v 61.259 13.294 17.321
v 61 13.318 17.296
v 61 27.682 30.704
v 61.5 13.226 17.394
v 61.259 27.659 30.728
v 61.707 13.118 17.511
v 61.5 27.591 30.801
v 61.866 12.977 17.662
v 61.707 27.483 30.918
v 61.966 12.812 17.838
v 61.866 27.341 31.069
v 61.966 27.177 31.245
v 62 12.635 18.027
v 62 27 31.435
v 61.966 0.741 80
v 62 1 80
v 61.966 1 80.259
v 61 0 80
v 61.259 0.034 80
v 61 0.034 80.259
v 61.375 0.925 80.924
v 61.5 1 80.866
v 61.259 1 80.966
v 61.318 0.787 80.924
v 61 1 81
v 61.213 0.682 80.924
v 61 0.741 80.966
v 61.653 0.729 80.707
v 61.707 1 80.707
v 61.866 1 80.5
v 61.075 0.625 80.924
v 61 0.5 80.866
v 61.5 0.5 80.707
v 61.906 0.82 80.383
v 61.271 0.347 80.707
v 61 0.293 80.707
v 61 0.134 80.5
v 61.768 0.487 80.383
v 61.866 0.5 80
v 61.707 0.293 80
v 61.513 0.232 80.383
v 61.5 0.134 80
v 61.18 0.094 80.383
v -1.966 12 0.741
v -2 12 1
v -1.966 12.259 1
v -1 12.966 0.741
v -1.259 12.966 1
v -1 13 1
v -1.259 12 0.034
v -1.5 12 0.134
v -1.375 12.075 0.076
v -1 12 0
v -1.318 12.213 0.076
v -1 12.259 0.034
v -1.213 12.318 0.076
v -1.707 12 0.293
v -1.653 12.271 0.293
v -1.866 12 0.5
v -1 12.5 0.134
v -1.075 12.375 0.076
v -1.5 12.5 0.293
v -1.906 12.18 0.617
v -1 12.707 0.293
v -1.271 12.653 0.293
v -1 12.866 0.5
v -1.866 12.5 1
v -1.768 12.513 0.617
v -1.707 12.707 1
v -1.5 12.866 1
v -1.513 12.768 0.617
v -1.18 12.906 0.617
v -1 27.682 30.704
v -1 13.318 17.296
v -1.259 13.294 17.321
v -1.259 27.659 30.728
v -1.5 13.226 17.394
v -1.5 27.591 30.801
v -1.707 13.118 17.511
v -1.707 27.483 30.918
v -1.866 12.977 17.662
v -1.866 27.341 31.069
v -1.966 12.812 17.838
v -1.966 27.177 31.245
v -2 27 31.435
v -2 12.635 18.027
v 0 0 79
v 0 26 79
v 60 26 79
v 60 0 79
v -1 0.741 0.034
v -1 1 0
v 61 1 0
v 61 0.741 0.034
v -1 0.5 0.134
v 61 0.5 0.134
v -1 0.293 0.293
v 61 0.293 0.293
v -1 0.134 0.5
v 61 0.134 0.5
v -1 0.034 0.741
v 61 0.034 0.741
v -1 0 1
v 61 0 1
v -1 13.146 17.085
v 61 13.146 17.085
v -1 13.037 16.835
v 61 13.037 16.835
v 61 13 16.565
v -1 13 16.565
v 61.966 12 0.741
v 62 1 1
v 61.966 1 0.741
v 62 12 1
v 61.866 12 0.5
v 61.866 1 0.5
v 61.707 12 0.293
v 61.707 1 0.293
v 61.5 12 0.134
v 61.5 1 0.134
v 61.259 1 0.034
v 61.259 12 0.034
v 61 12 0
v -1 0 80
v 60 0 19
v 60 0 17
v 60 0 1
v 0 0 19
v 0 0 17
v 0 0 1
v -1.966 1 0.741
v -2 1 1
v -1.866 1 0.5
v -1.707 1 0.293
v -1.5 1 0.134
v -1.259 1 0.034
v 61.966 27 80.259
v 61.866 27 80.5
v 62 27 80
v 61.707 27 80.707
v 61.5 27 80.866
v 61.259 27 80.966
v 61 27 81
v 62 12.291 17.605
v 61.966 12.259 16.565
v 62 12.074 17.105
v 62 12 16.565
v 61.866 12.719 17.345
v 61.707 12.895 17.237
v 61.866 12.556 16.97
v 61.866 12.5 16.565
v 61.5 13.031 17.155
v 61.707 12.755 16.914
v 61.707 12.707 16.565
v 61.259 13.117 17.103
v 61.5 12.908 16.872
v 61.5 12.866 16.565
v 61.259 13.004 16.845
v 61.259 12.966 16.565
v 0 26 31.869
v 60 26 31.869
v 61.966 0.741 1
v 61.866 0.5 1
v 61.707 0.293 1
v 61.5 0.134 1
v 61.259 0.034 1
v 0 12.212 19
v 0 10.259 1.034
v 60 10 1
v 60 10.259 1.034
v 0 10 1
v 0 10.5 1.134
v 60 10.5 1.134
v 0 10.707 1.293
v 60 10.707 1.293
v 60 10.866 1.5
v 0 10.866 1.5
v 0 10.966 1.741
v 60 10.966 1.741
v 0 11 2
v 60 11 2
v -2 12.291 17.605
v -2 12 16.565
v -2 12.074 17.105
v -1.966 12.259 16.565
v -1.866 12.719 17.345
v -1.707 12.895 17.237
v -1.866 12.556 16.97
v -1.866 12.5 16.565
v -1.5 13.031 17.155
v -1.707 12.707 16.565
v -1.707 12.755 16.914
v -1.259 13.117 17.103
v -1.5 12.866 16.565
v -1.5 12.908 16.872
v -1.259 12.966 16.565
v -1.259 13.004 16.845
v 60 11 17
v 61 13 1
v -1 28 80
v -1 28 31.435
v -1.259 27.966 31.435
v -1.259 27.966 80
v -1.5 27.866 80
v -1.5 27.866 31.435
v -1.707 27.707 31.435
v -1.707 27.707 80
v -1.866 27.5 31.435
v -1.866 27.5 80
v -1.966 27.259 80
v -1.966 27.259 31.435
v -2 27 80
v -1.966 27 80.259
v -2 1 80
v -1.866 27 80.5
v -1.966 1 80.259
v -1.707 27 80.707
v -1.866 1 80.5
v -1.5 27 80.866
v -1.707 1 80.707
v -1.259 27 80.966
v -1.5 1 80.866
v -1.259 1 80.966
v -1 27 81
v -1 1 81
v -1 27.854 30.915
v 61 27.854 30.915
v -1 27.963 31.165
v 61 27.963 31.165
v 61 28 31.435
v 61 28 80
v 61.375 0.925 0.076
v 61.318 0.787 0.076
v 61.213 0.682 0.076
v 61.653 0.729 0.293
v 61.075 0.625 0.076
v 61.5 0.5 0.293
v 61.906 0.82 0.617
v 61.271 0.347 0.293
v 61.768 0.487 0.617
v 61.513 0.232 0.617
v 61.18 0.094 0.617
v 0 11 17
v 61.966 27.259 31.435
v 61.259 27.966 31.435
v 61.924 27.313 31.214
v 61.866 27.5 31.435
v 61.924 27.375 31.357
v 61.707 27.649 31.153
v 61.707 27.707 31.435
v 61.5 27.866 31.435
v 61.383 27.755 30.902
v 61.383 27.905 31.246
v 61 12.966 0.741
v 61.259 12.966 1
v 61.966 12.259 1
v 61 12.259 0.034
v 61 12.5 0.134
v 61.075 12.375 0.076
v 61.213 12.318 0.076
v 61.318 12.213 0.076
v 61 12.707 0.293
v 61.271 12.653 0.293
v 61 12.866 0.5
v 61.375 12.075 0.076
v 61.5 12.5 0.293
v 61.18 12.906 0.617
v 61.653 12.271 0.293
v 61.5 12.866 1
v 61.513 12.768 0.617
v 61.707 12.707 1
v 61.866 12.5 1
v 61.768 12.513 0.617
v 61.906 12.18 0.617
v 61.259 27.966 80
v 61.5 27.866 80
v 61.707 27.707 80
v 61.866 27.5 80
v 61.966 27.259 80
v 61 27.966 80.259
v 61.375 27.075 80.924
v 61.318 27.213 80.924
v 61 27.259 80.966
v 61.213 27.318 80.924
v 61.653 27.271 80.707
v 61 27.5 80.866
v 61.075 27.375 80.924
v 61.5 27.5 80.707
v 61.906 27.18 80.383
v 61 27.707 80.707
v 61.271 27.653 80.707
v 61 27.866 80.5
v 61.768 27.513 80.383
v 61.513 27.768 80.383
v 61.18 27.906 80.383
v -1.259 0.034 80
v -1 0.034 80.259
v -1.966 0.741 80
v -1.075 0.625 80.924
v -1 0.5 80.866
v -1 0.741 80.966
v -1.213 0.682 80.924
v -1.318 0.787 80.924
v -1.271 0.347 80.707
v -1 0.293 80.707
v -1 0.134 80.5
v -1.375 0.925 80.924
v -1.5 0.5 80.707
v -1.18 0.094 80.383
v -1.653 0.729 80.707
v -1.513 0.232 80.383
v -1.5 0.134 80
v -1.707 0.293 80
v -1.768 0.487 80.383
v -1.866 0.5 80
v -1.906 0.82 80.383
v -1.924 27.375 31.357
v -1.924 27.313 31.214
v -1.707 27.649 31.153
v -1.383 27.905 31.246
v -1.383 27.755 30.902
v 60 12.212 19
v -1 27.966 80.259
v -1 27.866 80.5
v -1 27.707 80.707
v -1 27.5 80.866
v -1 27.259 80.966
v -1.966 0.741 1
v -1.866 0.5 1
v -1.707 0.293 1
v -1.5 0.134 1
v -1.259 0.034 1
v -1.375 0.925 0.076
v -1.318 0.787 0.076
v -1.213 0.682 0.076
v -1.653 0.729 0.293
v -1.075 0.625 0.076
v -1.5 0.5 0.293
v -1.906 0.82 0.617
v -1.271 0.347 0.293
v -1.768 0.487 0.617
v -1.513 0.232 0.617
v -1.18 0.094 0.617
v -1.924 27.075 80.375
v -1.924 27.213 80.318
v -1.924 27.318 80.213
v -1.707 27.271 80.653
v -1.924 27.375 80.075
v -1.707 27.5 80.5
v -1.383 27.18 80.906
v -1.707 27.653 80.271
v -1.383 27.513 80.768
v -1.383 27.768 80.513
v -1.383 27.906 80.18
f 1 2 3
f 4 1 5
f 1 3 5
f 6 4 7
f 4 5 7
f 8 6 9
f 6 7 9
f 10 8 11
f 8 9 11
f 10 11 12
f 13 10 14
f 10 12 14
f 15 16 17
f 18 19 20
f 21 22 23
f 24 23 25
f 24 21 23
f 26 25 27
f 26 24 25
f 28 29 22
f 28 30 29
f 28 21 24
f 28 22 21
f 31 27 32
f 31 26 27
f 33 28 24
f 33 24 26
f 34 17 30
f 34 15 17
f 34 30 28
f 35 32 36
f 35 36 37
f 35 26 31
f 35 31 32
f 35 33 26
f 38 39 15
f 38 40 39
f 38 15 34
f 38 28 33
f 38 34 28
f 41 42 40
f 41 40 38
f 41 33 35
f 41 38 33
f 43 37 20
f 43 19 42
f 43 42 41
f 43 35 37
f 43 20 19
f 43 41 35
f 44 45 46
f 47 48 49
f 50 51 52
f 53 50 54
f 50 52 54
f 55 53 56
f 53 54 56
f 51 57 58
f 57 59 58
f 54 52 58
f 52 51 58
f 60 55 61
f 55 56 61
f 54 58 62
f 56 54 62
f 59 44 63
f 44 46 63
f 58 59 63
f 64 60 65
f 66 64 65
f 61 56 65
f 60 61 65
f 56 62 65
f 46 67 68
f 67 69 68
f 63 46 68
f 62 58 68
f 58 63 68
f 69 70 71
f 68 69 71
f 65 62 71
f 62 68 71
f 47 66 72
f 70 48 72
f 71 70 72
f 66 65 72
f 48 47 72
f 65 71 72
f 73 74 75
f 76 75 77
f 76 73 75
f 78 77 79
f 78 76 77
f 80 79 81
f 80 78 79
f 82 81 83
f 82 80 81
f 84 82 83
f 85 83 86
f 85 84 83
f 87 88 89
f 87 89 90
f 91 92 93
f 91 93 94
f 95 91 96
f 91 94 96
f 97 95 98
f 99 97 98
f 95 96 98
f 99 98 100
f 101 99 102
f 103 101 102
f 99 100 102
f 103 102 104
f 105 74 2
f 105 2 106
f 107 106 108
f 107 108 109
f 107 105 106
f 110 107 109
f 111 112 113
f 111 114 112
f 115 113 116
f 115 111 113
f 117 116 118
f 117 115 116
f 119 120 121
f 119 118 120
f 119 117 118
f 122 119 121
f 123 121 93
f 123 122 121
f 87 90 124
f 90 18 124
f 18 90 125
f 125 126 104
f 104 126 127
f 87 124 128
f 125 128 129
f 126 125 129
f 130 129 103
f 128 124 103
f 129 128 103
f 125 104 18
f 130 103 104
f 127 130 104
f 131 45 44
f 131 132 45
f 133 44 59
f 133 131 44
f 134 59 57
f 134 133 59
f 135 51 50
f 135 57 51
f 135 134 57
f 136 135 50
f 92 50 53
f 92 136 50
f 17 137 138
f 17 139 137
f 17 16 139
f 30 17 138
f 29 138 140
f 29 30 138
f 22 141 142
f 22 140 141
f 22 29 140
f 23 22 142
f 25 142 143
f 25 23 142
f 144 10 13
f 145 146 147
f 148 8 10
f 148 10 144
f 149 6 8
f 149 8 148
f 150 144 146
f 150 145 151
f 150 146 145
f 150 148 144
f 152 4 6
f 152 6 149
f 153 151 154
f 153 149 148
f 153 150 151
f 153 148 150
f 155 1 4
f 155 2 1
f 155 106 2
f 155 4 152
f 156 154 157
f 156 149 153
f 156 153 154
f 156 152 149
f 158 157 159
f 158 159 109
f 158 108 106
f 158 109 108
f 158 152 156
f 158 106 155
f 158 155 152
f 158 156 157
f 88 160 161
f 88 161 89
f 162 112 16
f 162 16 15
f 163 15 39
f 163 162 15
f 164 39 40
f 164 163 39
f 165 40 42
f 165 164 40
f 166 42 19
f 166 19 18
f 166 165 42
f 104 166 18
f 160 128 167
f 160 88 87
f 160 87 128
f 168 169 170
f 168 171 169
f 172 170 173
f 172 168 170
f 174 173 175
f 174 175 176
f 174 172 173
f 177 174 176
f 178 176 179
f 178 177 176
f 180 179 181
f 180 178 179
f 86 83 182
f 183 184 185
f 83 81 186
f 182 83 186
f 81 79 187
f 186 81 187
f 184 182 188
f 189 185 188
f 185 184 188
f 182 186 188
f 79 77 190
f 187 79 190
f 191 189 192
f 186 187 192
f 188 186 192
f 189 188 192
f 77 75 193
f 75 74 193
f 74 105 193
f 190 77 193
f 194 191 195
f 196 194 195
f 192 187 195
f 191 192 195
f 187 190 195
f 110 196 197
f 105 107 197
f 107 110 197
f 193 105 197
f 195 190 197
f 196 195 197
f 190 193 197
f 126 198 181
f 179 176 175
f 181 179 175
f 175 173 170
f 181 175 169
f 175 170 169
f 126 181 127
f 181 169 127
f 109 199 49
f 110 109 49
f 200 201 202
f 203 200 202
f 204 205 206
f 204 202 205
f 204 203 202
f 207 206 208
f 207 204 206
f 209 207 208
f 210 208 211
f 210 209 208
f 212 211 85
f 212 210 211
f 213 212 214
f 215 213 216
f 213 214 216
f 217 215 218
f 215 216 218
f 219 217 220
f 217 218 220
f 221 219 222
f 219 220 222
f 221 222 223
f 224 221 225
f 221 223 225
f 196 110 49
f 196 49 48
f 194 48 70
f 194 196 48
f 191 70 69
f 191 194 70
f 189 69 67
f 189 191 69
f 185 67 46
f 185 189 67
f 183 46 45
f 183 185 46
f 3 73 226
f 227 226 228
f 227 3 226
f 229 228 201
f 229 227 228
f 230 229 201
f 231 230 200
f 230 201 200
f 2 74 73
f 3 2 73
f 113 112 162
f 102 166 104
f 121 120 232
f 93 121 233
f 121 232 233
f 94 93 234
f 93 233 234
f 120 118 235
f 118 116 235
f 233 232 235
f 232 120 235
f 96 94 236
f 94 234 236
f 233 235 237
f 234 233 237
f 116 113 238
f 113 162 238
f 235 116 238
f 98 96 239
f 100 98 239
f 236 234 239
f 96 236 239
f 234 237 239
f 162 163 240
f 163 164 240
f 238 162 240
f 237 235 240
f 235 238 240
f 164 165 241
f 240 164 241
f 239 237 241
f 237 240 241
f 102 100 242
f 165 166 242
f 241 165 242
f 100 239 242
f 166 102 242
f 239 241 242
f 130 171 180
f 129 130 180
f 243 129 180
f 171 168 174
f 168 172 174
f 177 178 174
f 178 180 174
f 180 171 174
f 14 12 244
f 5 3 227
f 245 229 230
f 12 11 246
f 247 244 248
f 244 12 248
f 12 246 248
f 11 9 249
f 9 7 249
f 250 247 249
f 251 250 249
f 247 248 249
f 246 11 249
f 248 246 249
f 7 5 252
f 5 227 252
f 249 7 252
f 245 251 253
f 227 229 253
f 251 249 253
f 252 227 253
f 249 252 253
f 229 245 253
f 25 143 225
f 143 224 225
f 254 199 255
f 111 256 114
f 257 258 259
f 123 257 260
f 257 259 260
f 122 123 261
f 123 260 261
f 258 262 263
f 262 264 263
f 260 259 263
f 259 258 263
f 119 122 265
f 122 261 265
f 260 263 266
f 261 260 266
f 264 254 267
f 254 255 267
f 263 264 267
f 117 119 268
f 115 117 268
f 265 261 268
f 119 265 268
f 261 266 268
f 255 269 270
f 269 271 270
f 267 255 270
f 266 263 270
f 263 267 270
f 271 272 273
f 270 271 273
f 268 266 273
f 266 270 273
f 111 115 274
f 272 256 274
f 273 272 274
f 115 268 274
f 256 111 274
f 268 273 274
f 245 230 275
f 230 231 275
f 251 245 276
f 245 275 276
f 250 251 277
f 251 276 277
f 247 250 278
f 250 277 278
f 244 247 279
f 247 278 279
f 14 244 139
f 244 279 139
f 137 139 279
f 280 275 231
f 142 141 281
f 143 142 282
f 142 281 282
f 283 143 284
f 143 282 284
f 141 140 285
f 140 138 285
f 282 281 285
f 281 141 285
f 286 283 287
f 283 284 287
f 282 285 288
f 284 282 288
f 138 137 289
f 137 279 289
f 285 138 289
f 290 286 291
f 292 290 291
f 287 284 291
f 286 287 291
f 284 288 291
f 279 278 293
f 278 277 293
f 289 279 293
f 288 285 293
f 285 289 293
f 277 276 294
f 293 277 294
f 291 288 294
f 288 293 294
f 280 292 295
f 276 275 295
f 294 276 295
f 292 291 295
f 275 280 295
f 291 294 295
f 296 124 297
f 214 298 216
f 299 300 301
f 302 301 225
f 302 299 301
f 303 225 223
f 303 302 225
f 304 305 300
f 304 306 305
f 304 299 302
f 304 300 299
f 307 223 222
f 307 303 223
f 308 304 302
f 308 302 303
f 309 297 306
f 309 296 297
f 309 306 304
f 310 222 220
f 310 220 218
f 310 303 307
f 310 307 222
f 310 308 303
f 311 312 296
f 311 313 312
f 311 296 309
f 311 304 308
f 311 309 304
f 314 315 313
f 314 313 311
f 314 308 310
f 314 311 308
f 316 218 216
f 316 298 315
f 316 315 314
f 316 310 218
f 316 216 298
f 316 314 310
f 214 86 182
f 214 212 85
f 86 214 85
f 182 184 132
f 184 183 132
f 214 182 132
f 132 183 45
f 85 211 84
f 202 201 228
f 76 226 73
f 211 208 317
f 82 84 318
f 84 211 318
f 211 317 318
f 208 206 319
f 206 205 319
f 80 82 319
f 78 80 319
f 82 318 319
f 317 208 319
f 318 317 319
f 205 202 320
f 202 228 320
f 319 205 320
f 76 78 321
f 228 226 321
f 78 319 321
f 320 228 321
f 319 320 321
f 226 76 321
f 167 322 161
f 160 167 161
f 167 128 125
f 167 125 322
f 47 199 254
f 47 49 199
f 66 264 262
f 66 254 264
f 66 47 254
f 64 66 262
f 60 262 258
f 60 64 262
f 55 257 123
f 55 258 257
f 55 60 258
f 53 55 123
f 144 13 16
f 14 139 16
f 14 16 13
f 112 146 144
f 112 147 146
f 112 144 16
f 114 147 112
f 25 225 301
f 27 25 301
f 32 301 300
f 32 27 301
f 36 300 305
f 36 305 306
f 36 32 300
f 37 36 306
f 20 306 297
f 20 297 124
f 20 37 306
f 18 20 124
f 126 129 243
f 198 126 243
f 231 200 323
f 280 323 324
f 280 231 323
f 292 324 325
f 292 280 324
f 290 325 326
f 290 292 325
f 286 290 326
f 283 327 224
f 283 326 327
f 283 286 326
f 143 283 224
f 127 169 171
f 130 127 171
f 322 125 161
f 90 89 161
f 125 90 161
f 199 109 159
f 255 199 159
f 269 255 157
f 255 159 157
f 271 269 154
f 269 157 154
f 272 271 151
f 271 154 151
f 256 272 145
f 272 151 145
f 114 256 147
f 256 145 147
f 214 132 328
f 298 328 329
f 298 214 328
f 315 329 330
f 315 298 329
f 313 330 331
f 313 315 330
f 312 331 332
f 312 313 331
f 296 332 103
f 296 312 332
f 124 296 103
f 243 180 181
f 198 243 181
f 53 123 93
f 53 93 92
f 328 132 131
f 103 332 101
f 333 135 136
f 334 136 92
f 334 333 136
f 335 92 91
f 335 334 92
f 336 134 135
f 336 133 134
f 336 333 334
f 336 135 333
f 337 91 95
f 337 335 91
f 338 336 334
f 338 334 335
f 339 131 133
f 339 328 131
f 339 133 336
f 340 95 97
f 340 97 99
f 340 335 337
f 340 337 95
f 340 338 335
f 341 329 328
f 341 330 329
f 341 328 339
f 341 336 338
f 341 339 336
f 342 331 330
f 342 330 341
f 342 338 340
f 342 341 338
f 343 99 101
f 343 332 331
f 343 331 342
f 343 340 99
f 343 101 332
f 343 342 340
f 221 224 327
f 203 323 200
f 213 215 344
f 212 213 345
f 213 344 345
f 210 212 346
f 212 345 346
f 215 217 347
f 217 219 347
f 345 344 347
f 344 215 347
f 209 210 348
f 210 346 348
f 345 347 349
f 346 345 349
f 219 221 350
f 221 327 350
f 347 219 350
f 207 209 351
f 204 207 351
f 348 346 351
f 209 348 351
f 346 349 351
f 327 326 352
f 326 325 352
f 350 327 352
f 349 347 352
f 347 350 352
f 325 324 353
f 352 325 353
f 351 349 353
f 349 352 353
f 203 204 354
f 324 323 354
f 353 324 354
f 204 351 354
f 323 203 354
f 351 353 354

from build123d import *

# Parameters (mm, degrees)
BOSS_EXTRUDE1_DEPTH = 17
SKETCH2_W           = 60
SKETCH2_H           = 11
BOSS_EXTRUDE2_DEPTH = 1
BOSS_EXTRUDE3_DEPTH = 64
CUT_EXTRUDE1_DEPTH  = 60
FILLET1_R           = 1


with BuildPart() as part:
    # Sketch1 → Boss-Extrude1 (new body)
    with BuildSketch(Plane.XY):
        Polygon((0, 0), (0, 11), (60, 11), (60, 0), (62, 0), (62, 13), (-2, 13), (-2, 0), align=None)
    extrude(amount=BOSS_EXTRUDE1_DEPTH)

    # Sketch2 → Boss-Extrude2 (add)
    with BuildSketch(Plane(origin=(0, 0, 0), x_dir=(-1, 0, 0), z_dir=(0, 0, -1))):
        with Locations((-30, 5.5)):
            Rectangle(SKETCH2_W, SKETCH2_H)
    extrude(amount=-BOSS_EXTRUDE2_DEPTH)

    # Sketch4 → Boss-Extrude3 (add)
    with BuildSketch(Plane.ZY.offset(2)):
        Polygon((17, 13), (31, 28), (81, 28), (81, 0), (17, 0), align=None)
    extrude(amount=-BOSS_EXTRUDE3_DEPTH)

    # Sketch6 → Cut-Extrude1 (cut)
    with BuildSketch(Plane.ZY):
        Polygon((19, 0), (19, 12.211673639), (31.869104604, 26), (79, 26), (79, 0), align=None)
    extrude(amount=-CUT_EXTRUDE1_DEPTH, mode=Mode.SUBTRACT)

    # Fillet1
    fillet1_edges = [part.edges().sort_by_distance(p)[0] for p in [
        (-2, 0, 40.5),
        (-2, 13, 8.5),
        (62, 13, 8.5),
        (62, 0, 40.5),
        (30, 11, 1),
        (30, 13, 17),
        (62, 20.5, 24),
        (62, 28, 56),
        (30, 28, 31),
        (62, 14, 81),
        (30, 28, 81),
        (30, 0, 81),
        (-2, 14, 81),
        (-2, 28, 56),
        (-2, 20.5, 24),
        (-2, 6.5, 0),
        (30, 13, 0),
        (62, 6.5, 0),
        (30, 0, 0),
    ]]
    fillet(fillet1_edges, radius=FILLET1_R - 0.0001)  # a hair under: the kernel refuses the full size


solid = part.part
